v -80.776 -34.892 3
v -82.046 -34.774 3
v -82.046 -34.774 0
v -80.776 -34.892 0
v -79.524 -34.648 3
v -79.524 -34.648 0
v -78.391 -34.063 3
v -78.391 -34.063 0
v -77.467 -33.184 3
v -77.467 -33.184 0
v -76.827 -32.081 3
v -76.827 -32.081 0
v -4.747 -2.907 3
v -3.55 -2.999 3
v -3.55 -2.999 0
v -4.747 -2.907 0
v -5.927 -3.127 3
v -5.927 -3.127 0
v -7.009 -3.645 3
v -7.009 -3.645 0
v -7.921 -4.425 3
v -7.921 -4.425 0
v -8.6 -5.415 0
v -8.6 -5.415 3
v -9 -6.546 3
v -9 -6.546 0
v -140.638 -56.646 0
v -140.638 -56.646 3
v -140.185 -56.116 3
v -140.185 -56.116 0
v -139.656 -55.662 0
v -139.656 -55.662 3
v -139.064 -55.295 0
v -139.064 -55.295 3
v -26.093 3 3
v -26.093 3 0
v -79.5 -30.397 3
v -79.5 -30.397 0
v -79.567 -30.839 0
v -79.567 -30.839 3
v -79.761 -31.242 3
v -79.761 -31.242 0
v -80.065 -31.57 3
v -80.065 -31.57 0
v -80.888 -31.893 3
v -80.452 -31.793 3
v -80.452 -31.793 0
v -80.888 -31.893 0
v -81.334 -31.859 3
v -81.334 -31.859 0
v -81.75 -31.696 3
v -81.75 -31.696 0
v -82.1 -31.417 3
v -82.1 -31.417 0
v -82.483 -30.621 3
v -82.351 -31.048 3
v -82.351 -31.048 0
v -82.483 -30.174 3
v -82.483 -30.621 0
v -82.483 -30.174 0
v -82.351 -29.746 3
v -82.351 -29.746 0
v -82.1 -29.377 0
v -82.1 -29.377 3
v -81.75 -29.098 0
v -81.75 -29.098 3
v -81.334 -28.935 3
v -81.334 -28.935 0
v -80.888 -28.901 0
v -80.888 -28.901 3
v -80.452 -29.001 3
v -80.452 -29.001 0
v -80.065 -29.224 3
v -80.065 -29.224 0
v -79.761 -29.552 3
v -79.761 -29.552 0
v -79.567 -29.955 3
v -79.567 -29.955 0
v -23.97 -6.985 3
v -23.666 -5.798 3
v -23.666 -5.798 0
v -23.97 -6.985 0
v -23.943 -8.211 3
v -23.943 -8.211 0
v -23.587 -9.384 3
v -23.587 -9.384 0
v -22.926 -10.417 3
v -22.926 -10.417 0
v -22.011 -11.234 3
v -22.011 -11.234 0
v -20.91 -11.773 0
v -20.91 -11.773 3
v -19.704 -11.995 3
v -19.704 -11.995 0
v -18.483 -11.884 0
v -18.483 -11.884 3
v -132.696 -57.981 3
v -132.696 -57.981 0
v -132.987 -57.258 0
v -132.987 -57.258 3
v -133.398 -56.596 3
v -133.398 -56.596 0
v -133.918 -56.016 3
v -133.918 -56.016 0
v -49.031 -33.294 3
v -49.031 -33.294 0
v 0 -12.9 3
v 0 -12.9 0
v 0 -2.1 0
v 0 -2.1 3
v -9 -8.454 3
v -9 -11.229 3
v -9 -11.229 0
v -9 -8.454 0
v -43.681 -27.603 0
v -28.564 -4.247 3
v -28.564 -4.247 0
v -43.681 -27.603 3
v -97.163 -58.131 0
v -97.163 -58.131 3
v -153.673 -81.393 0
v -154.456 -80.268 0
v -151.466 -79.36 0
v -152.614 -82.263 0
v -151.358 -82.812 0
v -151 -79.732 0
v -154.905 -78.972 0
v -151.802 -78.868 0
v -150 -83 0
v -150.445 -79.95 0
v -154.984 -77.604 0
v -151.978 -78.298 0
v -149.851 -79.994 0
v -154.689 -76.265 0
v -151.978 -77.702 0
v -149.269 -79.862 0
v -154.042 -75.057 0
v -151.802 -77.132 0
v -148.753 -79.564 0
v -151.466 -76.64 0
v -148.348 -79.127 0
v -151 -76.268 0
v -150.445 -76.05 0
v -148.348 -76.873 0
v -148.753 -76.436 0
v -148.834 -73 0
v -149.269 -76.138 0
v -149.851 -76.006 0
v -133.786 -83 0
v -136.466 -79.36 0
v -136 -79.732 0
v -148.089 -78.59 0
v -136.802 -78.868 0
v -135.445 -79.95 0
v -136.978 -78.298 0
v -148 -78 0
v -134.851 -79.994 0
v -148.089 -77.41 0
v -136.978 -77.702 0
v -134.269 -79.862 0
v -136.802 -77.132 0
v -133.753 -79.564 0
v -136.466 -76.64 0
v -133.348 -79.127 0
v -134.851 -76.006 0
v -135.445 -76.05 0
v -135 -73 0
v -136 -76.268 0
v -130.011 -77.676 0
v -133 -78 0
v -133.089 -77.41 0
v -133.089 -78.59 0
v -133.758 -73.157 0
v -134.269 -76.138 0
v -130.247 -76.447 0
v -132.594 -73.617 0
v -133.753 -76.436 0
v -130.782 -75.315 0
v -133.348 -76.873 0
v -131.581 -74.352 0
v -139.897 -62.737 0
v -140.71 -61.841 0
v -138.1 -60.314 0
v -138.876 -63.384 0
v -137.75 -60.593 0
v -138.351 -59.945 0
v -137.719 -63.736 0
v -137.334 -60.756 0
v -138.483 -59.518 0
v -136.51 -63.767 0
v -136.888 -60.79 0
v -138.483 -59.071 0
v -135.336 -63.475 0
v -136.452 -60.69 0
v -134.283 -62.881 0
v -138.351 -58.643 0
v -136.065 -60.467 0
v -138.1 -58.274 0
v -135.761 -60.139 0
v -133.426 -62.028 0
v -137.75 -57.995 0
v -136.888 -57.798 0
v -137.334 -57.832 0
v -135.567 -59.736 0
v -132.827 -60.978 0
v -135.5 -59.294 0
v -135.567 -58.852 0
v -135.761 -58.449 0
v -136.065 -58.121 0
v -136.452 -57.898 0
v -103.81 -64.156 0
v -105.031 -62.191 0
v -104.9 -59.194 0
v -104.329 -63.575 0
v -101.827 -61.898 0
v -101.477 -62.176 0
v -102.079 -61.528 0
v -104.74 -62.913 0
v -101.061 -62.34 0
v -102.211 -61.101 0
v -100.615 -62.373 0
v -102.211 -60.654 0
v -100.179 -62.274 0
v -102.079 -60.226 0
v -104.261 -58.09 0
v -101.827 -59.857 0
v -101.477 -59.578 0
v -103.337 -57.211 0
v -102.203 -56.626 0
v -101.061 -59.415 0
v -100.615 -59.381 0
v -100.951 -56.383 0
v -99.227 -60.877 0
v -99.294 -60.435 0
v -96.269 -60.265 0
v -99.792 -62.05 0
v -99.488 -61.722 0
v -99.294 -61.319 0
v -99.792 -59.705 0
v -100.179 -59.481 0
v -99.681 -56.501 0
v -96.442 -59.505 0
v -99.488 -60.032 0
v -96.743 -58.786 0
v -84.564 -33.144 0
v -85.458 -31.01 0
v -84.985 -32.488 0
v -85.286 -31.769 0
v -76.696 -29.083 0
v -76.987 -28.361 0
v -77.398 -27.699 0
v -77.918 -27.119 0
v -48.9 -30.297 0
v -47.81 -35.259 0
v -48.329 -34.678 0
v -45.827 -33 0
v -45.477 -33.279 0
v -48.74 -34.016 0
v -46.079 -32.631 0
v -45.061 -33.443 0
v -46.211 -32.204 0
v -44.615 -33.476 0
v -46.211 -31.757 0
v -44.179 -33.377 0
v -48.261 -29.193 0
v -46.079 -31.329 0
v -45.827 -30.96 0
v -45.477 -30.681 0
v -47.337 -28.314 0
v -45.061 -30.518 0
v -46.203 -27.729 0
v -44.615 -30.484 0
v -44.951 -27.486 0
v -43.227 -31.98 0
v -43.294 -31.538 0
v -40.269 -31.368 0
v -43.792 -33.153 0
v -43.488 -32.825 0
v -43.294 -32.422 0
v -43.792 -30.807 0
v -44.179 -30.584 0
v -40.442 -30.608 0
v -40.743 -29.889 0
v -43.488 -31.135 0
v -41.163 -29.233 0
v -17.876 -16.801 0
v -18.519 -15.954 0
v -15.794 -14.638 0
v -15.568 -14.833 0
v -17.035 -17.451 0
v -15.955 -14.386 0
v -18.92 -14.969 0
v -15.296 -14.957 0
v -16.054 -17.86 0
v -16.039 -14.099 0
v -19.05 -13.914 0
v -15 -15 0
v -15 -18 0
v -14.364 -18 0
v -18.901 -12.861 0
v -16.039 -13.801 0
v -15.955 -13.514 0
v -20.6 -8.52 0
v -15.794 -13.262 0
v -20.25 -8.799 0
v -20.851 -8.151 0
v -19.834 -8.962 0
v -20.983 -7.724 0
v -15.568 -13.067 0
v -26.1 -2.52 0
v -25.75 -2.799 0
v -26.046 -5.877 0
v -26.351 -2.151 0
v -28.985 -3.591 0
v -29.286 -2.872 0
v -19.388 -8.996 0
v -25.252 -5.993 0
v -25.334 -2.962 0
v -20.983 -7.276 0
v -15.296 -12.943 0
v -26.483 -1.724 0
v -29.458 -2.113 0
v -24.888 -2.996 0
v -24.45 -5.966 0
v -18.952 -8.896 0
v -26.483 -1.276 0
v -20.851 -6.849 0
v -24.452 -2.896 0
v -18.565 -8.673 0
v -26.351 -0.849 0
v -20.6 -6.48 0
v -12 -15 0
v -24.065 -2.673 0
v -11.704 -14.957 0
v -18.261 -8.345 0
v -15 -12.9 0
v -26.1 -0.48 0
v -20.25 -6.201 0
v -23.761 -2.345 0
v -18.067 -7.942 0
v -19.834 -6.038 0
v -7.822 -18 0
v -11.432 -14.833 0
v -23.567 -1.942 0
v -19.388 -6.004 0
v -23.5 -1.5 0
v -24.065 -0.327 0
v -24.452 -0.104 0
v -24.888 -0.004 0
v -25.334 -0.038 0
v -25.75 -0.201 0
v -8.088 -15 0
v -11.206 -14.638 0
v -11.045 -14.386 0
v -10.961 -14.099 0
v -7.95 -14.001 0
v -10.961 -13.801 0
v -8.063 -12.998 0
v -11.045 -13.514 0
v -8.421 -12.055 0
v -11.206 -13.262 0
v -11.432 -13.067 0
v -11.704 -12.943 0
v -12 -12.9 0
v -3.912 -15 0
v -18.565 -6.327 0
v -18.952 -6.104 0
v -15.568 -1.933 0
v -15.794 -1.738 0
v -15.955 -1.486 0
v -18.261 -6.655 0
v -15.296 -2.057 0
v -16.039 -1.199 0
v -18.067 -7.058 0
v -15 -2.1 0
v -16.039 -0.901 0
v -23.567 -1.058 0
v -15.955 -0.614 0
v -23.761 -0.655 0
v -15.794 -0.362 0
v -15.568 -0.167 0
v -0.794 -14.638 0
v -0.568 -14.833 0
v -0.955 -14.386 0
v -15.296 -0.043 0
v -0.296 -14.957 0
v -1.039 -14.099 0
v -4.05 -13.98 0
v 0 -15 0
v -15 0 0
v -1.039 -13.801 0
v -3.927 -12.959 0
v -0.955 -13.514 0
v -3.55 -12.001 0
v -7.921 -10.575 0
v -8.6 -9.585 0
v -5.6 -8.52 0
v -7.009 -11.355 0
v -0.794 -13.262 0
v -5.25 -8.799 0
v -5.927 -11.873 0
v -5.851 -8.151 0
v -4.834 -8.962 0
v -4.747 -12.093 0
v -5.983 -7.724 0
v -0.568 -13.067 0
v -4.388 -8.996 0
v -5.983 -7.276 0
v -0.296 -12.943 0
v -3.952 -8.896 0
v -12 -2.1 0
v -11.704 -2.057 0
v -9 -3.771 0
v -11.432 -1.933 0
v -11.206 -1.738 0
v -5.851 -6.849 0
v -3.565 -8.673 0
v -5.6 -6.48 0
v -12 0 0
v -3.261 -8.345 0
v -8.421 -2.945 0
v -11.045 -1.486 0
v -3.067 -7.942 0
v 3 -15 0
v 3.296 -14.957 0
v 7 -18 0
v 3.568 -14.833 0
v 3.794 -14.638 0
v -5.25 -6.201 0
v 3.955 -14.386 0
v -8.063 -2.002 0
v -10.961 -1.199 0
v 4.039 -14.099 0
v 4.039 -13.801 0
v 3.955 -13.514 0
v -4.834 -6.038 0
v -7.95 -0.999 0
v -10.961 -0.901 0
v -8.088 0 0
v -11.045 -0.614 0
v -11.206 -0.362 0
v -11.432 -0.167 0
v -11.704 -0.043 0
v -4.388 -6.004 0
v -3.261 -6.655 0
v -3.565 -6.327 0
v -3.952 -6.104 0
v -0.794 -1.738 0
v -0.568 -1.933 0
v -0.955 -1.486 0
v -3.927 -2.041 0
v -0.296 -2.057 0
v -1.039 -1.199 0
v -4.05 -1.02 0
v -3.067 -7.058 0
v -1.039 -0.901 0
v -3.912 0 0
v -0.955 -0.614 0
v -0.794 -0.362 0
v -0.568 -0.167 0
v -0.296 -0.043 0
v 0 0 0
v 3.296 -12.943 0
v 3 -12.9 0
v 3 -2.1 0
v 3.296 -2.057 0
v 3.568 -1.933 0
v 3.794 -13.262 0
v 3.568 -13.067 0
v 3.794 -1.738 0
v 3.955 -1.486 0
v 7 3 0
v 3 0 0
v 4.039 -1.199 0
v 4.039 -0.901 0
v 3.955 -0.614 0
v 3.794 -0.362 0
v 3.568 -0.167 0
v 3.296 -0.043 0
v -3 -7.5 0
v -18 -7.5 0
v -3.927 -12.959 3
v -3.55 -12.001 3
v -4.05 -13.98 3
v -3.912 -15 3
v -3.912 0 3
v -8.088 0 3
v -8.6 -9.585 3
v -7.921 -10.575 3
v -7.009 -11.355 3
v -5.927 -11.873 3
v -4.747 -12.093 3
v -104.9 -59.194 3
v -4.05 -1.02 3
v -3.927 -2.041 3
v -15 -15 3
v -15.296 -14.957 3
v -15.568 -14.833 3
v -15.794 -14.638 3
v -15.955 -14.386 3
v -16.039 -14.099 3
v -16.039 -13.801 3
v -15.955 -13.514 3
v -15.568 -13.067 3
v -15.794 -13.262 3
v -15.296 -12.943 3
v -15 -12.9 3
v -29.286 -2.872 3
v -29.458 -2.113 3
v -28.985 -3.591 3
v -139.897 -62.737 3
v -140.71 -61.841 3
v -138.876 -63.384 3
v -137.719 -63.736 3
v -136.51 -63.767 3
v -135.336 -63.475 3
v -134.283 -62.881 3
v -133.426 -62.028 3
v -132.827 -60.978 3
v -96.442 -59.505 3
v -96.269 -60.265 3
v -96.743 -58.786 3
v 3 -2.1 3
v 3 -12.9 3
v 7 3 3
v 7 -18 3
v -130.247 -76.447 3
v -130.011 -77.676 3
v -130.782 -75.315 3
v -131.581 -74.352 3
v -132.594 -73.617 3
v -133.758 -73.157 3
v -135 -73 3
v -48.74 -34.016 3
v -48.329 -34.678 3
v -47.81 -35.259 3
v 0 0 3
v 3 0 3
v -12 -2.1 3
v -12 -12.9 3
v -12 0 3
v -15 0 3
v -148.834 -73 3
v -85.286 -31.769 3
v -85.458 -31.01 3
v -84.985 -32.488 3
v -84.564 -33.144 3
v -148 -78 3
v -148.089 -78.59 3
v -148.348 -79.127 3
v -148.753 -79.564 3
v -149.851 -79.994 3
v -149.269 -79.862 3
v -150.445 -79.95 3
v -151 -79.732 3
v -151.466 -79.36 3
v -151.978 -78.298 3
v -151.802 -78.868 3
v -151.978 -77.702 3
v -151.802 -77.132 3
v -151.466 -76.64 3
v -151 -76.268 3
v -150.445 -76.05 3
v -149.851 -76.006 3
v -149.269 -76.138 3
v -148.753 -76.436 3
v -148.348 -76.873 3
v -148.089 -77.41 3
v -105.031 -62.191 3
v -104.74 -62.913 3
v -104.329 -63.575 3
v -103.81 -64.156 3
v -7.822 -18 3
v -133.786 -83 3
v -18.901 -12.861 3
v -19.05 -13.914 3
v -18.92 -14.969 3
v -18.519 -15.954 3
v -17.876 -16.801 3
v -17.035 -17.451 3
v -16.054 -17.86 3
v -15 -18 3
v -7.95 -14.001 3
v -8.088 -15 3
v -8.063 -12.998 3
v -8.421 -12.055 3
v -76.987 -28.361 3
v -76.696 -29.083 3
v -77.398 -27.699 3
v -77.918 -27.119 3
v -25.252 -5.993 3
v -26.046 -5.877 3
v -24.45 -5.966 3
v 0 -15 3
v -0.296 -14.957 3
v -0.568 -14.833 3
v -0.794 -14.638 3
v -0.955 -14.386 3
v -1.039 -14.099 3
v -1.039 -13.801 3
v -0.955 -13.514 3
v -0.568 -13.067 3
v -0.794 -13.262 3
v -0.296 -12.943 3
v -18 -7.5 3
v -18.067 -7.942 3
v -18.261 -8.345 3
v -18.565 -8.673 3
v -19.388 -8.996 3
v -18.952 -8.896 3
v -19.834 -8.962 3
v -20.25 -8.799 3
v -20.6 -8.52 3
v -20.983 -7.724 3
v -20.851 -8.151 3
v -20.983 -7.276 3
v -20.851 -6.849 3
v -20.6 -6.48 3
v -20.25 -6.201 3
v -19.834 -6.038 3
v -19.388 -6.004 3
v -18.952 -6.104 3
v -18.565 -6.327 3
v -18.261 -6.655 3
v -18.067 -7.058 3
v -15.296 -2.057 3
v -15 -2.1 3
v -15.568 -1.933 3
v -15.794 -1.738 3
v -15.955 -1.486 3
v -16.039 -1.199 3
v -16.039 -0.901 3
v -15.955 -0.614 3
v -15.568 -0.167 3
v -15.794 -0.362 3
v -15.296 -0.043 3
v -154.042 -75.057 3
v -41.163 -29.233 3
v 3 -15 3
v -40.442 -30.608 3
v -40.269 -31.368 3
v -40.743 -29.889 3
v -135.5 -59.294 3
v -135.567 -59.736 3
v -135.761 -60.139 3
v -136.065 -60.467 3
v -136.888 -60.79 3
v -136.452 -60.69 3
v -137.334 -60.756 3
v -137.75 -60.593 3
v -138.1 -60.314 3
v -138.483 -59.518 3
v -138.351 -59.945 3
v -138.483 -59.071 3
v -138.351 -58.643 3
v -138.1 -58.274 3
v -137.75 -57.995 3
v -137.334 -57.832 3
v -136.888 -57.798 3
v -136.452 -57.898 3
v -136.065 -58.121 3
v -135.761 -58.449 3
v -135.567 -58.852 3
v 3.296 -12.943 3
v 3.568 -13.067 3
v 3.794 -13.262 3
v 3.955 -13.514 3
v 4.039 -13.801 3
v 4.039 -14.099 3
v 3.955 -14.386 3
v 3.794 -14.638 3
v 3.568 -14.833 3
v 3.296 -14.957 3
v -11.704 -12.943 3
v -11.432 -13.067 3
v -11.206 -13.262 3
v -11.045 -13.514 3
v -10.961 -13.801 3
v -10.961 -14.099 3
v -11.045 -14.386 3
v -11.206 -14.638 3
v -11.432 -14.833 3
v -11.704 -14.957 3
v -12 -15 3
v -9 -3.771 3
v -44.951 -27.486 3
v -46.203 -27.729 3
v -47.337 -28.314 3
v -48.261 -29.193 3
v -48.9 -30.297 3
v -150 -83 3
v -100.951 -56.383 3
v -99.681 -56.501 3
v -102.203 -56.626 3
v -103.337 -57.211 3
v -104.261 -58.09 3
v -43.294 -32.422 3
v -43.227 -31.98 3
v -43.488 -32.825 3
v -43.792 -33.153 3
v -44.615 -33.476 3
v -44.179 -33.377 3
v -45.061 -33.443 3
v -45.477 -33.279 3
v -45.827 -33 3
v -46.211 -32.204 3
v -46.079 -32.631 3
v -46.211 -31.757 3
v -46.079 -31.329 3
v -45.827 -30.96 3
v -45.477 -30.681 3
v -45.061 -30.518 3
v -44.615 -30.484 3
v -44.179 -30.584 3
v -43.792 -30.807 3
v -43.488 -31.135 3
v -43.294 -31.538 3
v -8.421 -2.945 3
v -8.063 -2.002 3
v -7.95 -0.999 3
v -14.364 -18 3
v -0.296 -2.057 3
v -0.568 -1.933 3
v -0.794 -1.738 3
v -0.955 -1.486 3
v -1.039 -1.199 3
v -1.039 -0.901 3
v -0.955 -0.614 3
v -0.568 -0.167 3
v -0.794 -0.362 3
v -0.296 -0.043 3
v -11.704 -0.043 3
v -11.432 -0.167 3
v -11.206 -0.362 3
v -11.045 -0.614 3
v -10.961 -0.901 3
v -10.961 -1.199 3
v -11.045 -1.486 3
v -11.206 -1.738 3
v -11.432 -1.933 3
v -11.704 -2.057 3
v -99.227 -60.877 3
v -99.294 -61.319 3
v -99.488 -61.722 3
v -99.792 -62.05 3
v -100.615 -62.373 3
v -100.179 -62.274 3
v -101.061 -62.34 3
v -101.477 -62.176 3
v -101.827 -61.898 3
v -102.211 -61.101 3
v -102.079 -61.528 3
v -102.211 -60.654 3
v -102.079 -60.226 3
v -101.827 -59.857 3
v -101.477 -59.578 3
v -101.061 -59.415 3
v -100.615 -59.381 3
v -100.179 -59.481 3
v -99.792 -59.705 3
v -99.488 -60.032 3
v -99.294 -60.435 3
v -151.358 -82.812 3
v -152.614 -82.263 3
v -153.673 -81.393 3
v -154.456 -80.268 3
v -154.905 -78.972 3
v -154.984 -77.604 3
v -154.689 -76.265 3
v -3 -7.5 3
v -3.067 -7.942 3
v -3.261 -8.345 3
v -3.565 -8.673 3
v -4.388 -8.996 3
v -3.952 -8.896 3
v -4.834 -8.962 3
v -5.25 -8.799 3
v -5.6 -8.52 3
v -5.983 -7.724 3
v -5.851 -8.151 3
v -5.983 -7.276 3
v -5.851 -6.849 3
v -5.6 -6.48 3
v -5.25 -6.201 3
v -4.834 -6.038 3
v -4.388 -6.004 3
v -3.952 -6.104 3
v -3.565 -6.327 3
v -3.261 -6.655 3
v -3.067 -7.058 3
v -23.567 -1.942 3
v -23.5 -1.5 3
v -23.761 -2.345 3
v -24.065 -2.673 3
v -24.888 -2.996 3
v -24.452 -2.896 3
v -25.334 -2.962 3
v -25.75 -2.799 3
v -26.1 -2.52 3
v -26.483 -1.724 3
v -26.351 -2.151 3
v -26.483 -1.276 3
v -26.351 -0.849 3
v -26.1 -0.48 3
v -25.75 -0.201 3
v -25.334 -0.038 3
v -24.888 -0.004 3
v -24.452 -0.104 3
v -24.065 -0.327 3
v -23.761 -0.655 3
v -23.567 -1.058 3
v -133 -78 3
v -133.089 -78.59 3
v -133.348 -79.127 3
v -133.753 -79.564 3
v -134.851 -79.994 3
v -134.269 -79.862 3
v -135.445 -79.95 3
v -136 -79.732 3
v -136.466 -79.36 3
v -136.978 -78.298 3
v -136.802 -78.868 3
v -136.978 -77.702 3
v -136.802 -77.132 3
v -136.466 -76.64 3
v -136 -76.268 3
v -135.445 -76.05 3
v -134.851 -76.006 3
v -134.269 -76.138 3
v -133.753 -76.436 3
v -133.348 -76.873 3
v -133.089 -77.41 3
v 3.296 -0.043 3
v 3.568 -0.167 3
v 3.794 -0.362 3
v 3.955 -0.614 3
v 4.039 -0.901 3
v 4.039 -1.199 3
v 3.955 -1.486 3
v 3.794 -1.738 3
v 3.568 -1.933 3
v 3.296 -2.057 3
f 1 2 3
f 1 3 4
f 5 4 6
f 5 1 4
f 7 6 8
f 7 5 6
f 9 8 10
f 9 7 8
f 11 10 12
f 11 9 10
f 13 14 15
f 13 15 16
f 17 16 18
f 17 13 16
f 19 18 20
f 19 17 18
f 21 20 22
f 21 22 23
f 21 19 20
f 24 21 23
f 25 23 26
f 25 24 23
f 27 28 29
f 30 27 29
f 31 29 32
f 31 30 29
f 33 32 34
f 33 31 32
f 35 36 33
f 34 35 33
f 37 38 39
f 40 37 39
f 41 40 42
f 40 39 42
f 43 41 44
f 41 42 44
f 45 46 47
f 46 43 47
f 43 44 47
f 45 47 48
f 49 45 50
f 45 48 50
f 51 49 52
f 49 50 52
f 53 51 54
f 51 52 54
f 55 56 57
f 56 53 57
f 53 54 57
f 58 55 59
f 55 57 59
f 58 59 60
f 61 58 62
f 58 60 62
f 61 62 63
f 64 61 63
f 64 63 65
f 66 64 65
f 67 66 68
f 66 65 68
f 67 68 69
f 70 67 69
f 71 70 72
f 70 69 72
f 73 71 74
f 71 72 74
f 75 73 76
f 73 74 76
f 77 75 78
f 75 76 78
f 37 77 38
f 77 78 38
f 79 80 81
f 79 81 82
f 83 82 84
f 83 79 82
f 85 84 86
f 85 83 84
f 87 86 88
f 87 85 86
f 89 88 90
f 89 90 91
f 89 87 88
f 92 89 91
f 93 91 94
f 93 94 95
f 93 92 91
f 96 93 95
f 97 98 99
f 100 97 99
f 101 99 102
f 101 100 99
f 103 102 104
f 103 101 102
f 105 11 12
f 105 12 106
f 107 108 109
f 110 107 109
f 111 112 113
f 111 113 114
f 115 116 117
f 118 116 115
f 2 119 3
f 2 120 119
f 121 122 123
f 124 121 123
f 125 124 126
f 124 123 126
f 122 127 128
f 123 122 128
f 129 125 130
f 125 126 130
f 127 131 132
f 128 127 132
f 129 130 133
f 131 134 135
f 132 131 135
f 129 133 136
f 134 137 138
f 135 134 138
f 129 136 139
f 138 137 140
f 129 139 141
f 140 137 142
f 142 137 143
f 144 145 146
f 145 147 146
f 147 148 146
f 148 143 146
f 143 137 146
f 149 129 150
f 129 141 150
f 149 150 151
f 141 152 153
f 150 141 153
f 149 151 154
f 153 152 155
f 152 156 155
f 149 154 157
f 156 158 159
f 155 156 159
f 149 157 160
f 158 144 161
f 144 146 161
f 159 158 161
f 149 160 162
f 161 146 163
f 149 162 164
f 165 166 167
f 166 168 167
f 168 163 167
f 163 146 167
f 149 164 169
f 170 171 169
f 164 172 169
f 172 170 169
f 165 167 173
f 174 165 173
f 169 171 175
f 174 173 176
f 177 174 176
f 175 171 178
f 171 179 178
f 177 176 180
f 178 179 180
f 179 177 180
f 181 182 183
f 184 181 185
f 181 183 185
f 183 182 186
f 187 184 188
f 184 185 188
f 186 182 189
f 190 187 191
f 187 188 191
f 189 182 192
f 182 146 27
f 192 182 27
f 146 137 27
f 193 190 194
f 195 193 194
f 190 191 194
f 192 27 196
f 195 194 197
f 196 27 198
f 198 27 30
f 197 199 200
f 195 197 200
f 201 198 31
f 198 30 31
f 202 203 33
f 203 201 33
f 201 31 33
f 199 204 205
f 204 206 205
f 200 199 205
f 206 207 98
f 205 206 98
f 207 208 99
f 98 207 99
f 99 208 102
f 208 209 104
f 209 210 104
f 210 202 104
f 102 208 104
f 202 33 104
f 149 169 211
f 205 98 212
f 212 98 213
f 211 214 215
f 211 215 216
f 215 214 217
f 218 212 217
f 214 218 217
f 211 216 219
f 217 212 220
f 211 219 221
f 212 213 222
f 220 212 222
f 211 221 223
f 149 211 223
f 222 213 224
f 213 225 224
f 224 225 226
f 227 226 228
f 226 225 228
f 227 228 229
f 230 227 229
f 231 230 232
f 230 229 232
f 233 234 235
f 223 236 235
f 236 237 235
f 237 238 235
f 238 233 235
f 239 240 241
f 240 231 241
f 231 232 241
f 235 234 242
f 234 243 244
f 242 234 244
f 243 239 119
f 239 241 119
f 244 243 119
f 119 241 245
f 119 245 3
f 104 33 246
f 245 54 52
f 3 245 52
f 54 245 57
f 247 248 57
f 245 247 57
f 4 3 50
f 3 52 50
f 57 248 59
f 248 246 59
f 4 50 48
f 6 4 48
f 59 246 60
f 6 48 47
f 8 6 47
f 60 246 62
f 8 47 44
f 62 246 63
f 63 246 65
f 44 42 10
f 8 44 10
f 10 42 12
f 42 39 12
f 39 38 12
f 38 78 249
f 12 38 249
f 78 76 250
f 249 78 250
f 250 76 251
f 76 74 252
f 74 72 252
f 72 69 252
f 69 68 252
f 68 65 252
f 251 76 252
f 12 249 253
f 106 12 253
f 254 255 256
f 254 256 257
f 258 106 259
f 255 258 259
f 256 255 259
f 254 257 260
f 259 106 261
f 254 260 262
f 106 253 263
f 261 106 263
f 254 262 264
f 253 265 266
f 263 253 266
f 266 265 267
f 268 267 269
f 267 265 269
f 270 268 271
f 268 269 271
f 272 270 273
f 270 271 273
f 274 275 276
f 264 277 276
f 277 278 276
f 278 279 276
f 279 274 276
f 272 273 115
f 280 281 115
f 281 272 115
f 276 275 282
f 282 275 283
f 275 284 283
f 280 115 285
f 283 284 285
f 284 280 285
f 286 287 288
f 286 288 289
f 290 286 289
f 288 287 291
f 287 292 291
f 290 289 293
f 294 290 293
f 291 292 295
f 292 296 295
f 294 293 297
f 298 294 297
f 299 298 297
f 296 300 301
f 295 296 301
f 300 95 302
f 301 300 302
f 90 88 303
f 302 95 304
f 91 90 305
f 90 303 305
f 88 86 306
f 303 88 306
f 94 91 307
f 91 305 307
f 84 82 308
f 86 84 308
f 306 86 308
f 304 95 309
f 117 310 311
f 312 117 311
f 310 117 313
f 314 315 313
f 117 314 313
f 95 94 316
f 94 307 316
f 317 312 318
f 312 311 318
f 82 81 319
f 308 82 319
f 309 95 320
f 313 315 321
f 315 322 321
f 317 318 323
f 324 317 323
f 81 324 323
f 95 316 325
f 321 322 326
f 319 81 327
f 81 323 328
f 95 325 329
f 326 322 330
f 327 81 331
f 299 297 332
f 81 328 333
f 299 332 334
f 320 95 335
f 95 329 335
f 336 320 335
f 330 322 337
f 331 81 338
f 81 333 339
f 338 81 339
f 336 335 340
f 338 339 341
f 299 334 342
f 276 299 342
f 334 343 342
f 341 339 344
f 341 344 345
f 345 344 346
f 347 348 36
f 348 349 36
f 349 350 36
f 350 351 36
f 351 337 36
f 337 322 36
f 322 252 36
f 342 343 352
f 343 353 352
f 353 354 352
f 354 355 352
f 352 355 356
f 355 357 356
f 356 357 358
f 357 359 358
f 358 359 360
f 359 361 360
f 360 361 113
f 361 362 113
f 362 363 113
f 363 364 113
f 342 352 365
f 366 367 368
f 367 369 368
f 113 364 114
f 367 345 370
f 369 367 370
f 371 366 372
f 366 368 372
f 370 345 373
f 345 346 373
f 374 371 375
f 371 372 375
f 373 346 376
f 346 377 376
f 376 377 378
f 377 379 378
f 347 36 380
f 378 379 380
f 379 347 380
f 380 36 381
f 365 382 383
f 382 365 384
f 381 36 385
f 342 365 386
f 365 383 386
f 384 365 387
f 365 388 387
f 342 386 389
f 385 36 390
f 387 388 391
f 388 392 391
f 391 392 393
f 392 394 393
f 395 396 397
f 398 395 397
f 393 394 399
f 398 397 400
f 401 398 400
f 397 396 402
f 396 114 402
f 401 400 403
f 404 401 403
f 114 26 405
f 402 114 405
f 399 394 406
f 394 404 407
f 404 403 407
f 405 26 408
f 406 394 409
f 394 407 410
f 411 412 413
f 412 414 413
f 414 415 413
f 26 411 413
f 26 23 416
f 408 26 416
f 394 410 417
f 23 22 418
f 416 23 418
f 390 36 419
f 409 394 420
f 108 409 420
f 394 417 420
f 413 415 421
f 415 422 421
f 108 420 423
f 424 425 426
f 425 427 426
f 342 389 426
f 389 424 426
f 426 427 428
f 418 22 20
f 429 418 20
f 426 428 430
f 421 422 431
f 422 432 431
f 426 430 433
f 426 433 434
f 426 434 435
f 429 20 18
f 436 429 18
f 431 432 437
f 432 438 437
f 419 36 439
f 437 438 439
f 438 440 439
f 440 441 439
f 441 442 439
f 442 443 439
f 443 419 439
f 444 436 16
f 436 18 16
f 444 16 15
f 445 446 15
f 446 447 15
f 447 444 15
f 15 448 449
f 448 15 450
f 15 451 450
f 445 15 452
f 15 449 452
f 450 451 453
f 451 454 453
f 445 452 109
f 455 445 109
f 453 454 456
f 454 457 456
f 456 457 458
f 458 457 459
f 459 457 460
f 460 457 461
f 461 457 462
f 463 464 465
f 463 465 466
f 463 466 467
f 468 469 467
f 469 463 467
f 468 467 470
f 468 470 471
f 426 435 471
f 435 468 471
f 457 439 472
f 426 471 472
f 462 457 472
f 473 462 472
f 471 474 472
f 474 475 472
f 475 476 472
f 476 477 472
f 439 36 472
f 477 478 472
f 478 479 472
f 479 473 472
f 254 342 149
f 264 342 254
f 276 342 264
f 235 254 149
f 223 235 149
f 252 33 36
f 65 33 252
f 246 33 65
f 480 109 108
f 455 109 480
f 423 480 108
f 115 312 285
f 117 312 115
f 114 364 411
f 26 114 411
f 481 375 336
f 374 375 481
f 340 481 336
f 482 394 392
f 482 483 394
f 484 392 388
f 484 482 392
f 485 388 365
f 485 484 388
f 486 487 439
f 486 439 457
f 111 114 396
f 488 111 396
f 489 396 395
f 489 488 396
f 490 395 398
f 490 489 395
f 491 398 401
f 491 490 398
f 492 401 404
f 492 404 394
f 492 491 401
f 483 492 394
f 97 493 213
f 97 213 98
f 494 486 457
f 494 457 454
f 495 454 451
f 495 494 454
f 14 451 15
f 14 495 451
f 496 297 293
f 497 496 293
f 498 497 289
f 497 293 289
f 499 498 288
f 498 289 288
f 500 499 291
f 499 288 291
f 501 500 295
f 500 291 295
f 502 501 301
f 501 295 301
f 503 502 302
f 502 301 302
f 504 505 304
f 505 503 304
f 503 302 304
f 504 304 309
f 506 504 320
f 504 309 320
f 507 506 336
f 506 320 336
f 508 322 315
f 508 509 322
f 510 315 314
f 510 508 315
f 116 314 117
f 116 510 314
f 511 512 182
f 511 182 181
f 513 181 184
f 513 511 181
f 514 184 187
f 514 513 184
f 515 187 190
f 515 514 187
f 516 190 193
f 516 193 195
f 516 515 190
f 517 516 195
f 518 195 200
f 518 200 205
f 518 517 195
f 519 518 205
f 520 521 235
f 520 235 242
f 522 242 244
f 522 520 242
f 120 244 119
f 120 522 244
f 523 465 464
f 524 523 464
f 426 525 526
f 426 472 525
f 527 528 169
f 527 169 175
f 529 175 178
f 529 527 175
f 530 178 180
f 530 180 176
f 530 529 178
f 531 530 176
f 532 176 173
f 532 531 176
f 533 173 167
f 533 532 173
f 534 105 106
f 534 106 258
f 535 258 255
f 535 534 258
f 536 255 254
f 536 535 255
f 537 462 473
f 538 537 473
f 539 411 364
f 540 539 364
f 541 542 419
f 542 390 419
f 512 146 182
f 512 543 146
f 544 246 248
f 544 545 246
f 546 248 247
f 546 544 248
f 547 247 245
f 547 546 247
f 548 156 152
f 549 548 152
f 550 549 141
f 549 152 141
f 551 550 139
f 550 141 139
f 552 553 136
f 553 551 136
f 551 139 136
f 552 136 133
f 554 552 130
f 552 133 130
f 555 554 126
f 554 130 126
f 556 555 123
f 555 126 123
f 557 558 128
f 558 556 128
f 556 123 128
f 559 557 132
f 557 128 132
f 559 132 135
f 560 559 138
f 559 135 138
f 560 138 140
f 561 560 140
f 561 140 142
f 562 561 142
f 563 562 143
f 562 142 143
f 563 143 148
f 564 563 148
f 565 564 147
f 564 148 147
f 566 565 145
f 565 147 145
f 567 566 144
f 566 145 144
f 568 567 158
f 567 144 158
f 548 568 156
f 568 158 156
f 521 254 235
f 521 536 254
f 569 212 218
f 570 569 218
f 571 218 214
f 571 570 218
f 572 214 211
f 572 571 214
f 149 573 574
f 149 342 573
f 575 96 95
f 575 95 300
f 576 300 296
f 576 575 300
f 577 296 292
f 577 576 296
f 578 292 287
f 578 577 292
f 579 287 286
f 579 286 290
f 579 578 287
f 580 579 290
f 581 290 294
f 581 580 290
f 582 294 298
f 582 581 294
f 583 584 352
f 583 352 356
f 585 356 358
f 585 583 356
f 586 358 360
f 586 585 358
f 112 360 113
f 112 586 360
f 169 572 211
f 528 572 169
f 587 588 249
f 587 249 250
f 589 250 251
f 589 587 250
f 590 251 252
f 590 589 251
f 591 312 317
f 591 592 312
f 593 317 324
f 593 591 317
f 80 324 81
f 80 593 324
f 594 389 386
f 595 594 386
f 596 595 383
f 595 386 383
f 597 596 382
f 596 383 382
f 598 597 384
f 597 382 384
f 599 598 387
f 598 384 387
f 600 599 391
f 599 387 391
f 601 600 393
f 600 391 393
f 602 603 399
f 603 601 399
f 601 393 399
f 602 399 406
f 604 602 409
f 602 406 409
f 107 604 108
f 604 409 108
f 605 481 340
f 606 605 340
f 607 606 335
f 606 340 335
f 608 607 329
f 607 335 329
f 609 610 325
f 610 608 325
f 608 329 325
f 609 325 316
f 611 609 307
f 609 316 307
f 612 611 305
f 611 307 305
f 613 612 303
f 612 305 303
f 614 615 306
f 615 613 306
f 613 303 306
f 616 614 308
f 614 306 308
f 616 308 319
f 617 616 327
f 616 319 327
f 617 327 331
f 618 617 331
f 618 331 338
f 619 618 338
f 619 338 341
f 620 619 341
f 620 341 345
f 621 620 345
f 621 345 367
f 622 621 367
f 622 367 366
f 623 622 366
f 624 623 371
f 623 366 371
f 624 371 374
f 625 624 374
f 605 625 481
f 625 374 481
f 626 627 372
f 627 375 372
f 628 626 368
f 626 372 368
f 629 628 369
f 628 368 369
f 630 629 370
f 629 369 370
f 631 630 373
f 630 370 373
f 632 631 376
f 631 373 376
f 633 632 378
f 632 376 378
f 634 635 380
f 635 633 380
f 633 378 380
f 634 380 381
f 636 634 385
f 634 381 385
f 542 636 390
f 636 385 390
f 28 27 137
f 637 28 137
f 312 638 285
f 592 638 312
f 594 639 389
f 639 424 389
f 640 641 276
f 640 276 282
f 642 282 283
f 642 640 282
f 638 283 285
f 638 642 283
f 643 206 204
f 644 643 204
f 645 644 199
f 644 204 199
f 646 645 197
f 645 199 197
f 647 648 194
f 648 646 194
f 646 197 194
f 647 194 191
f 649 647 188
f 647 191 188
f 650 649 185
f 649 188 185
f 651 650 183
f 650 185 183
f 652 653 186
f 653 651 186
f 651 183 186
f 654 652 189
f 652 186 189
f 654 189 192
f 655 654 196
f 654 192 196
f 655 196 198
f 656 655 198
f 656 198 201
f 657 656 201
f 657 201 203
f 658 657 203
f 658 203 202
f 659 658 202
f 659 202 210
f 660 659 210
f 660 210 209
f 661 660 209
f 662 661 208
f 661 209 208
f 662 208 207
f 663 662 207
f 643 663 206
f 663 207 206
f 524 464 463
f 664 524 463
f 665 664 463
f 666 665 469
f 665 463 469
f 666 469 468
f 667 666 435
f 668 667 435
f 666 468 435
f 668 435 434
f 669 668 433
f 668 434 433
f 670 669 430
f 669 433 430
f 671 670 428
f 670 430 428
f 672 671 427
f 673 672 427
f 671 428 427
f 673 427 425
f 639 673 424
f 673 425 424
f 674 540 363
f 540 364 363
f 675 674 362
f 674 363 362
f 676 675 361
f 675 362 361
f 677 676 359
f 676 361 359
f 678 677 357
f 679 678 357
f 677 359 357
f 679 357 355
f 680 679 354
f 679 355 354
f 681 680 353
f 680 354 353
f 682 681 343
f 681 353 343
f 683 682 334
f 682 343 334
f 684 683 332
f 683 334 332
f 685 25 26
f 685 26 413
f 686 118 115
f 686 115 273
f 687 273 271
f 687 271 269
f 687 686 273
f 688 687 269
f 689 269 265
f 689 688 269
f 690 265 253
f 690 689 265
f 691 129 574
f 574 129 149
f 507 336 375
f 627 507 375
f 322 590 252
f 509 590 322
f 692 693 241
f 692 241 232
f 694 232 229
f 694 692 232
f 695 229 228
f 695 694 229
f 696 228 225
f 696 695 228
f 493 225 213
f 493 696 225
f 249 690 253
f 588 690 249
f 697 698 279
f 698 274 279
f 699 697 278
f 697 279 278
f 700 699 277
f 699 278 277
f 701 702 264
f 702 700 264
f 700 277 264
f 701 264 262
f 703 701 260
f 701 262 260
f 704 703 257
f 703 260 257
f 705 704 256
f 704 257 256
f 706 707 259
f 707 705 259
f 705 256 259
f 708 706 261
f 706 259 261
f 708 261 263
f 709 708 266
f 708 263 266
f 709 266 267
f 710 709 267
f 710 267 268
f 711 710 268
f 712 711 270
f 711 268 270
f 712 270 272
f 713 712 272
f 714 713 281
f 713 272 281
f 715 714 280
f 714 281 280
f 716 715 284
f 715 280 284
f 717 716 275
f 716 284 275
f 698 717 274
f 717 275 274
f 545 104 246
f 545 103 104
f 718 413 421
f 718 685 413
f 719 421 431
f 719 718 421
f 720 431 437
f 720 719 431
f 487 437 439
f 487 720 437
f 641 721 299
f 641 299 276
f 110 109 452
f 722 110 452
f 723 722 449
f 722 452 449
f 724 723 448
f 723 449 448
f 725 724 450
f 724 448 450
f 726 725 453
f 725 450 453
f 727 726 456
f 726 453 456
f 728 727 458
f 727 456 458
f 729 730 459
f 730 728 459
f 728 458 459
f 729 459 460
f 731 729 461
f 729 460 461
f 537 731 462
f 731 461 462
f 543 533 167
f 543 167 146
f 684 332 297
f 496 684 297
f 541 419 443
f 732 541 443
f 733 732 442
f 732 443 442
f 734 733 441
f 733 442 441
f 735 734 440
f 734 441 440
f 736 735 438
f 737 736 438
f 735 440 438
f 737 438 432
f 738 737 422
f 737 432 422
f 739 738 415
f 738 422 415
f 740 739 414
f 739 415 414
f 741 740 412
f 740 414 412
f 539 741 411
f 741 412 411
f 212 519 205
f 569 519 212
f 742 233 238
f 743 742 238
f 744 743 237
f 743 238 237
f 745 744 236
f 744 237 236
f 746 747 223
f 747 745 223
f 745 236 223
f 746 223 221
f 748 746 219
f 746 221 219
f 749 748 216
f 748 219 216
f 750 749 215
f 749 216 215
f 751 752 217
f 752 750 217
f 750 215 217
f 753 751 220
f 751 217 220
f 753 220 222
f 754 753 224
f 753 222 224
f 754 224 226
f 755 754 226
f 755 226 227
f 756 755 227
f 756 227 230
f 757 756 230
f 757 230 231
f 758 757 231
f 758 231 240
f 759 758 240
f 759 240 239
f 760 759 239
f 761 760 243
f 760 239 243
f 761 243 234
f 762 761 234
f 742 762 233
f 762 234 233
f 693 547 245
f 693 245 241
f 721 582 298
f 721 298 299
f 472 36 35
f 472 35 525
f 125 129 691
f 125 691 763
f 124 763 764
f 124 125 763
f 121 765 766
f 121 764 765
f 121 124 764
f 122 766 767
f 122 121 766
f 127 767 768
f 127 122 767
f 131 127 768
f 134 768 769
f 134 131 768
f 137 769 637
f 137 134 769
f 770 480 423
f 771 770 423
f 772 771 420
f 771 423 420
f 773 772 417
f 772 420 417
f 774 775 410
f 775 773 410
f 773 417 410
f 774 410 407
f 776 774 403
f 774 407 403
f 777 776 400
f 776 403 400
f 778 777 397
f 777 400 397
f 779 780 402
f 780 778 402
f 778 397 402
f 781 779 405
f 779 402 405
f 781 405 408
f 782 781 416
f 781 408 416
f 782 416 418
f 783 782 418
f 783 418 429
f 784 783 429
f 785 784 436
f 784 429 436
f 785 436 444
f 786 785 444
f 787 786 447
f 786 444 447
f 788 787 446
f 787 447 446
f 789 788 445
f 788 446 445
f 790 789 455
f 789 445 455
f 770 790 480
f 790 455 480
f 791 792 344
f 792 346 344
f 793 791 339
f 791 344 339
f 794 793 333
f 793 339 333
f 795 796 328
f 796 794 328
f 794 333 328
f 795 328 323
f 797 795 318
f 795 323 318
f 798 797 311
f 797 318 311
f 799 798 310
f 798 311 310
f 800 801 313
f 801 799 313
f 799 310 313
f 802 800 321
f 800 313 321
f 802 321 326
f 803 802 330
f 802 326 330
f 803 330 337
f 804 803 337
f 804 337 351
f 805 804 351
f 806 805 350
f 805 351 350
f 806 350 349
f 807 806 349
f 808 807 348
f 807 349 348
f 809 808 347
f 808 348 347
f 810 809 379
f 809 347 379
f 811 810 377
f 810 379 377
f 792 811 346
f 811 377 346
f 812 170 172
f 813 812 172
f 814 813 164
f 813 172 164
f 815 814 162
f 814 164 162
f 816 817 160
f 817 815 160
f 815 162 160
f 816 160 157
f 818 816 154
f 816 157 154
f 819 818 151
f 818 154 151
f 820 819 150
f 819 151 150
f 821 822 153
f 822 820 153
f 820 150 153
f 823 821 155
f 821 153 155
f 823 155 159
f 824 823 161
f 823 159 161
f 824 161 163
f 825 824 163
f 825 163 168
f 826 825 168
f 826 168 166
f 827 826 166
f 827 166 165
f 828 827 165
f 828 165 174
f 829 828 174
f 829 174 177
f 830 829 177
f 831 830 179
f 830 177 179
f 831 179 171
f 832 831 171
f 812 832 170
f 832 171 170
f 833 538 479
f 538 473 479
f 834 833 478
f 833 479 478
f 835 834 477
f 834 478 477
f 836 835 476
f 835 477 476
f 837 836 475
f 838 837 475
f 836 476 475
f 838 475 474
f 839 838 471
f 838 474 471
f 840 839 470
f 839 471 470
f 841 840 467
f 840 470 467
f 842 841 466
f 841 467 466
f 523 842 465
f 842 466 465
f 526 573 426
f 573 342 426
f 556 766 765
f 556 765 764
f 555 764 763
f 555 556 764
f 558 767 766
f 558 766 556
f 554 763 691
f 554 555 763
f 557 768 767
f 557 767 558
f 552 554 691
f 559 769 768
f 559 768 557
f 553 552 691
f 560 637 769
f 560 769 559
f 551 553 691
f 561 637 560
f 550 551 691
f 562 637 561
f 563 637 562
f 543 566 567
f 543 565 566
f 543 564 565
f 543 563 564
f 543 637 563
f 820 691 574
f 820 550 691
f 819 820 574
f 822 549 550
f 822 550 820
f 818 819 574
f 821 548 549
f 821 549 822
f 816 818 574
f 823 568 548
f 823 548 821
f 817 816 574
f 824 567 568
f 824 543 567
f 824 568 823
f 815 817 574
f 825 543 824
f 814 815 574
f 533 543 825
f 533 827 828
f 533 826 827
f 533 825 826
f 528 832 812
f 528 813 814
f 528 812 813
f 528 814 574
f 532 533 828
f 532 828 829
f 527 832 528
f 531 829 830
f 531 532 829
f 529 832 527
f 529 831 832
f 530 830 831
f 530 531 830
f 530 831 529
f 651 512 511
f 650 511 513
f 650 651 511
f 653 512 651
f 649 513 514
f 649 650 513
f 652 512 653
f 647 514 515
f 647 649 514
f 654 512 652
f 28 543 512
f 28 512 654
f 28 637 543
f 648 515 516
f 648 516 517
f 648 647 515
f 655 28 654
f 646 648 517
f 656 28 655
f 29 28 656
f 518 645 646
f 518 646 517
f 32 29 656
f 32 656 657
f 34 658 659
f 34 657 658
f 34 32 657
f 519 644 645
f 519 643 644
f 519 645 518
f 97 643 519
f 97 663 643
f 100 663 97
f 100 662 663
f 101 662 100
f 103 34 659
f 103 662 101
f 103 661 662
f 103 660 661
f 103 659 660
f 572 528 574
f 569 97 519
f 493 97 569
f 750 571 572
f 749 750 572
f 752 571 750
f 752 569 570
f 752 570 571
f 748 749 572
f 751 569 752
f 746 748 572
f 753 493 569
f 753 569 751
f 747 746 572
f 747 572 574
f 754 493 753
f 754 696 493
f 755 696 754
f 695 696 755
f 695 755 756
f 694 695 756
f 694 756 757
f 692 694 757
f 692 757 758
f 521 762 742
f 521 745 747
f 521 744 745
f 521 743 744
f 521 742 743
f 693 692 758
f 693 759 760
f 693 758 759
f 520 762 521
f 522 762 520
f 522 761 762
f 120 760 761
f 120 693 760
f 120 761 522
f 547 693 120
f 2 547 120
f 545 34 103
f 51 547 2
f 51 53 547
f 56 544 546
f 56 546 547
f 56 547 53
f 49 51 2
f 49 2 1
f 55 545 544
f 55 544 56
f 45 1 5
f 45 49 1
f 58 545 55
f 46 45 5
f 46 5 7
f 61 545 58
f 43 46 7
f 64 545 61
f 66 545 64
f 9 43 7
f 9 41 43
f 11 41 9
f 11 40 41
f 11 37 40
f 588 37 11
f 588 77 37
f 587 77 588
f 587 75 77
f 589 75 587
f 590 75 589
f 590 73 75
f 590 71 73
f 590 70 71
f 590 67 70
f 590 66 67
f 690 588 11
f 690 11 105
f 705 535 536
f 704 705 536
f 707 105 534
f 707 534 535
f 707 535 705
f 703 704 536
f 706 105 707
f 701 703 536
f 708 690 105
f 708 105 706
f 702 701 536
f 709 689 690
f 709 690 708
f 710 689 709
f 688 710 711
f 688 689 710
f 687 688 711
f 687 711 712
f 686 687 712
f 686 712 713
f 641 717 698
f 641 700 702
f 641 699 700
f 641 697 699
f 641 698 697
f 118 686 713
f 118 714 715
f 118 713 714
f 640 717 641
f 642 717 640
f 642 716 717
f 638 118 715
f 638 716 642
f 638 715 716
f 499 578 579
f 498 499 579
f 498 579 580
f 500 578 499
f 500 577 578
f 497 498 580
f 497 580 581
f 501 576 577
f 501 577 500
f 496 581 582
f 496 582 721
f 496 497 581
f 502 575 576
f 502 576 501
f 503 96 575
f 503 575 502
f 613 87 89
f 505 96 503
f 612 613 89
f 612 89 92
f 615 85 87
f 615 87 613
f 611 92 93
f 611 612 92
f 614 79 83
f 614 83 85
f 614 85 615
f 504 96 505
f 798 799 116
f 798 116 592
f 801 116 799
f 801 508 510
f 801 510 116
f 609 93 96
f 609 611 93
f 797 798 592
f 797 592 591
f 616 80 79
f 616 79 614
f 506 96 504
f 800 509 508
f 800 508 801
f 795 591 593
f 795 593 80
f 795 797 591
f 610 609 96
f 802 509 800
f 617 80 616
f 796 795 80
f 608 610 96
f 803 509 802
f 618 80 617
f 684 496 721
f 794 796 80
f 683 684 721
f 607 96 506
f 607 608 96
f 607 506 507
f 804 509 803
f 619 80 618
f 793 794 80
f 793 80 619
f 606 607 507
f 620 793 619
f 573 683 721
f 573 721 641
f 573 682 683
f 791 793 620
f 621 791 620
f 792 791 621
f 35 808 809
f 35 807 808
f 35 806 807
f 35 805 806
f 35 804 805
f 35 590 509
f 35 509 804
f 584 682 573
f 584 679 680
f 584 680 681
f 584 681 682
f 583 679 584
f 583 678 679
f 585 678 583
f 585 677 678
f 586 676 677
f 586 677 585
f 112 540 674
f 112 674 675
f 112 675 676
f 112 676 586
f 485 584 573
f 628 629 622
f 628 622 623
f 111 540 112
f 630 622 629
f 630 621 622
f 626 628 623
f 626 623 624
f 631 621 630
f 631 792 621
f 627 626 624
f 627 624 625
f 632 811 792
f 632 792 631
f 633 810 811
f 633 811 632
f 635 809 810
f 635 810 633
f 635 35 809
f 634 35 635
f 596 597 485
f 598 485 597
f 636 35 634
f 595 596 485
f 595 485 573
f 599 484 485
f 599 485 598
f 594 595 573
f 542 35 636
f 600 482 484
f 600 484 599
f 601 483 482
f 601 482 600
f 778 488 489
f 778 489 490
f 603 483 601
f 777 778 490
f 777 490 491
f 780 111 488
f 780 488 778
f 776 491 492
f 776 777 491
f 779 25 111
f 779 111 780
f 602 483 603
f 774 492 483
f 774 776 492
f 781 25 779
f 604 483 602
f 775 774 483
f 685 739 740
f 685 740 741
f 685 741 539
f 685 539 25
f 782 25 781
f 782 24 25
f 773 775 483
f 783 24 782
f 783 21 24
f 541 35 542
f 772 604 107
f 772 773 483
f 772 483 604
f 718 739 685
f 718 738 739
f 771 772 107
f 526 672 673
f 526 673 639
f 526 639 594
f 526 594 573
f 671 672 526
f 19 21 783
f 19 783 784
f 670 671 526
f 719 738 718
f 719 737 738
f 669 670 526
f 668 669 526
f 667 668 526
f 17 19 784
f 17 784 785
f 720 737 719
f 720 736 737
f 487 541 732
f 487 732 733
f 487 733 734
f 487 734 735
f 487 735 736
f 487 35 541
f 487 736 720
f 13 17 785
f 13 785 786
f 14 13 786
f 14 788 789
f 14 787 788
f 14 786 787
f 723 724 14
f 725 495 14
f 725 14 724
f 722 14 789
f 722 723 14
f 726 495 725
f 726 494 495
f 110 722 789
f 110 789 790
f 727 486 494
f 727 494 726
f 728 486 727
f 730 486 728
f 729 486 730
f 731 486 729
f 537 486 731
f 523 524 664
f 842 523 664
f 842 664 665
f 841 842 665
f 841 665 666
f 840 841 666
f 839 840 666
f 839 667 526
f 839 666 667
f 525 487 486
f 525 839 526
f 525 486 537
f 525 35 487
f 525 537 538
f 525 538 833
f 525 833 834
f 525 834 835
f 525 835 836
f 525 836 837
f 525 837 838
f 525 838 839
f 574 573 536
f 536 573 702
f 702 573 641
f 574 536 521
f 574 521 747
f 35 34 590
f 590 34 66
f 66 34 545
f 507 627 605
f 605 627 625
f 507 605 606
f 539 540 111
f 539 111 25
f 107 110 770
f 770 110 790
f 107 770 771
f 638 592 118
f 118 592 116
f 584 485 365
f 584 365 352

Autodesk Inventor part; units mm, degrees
ref_plane "YZ Plane" through (0, 0, 0) normal (1, 0, 0) x (0, 1, 0)
ref_plane "XZ Plane" through (0, 0, 0) normal (0, 1, 0) x (-1, 0, 0)
ref_plane "XY Plane" through (0, 0, 0) normal (0, 0, 1) x (1, 0, 0)
sketch "スケッチ1" plane through (0, 0, 0) normal (0, 0, 1) x (1, 0, 0)
  line L0 (0, 0) -> (3, 0)
  line L1 (3, 0) -> (3, -15)
  line L2 (3, -15) -> (0, -15)
  line L3 (0, -15) -> (0, 0)
  line L4 (-15, 0) -> (-12, 0)
  line L5 (-12, 0) -> (-12, -15)
  line L6 (-12, -15) -> (-15, -15)
  line L7 (-15, -15) -> (-15, 0)
  line L8 (-26.0926, 3) -> (-139.0635, -55.2952)
  line L9 (7, 3) -> (7, -18)
  line L10 (-7.8217, -18) -> (-133.786, -83)
  circle A0 centre (-135, -78) radius 2
  circle A1 centre (-150, -78) radius 2
  line L11 (-150, -78) -> (-135, -78) construction
  arc A2 (-154.0422, -75.0571) -> (-150, -83) centre (-150, -78) ccw
  line L12 (-140.638, -56.6456) -> (-154.0422, -75.0571)
  circle A3 centre (-15, -1.05) radius 1.05
  circle A4 centre (-15, -13.95) radius 1.05
  circle A5 centre (-12, -13.95) radius 1.05
  circle A6 centre (-12, -1.05) radius 1.05
  circle A7 centre (0, -1.05) radius 1.05
  circle A8 centre (3, -1.05) radius 1.05
  circle A9 centre (0, -13.95) radius 1.05
  circle A10 centre (3, -13.95) radius 1.05
  arc A11 (-139.0635, -55.2952) -> (-140.638, -56.6456) centre (-137, -59.2941) ccw
  circle A12 centre (-100.7273, -60.8773) radius 4.5 construction
  circle A13 centre (-81, -30.3971) radius 4.5 construction
  circle A14 centre (-44.7273, -31.9802) radius 4.5 construction
  circle A15 centre (-25, -1.5) radius 4.5 construction
  circle A16 centre (-137, -59.2941) radius 1.5
  circle A17 centre (-100.7273, -60.8773) radius 1.5
  circle A18 centre (-81, -30.3971) radius 1.5
  circle A19 centre (-44.7273, -31.9802) radius 1.5
  circle A20 centre (-25, -1.5) radius 1.5
  circle A21 centre (-4.5, -7.5) radius 1.5
  circle A22 centre (-19.5, -7.5) radius 1.5
  line L13 (-26.0926, 3) -> (7, 3)
  line L14 (-7.8217, -18) -> (7, -18)
  line L15 (-150, -83) -> (-133.786, -83)
  circle A23 centre (-135, -78) radius 5
  line L16 (-25, -1.5) -> (-44.7273, -31.9802) construction
  line L17 (-44.7273, -31.9802) -> (-81, -30.3971) construction
  line L18 (-81, -30.3971) -> (-100.7273, -60.8773) construction
  line L19 (-100.7273, -60.8773) -> (-137, -59.2941) construction
  point P0 (0, -12.9)
  point P1 (0, -2.1)
  point P2 (3, -2.1)
  point P3 (3, -12.9)
  point P4 (-12, -2.1)
  point P5 (-12, -12.9)
  point P6 (-15, -12.9)
  point P7 (-15, -2.1)
  dimension "d0" = 3
  dimension "d1" = 15
  dimension "d2" = 3
  dimension "d3" = 15
  dimension "d4" = 12
  dimension "d5" = 4
  dimension "d6" = 4
  dimension "d7" = 15
  dimension "d8" = 4
  dimension "d12" = 3
  dimension "d13" = 2.1
  dimension "d14" = 2.1
  dimension "d15" = 2.1
  dimension "d16" = 2.1
  dimension "d17" = 2.1
  dimension "d18" = 2.1
  dimension "d19" = 2.1
  dimension "d20" = 2.1
  dimension "d23" = 9
  dimension "d24" = 9
  dimension "d25" = 9
  dimension "d26" = 9
  dimension "d27" = 9
  dimension "d28" = 3
  dimension "d29" = 3
  dimension "d30" = 3
  dimension "d31" = 3
  dimension "d32" = 3
  dimension "d33" = 10
  dimension "d34" = 3
  dimension "d35" = 3
  dimension "d36" = 4.5
  dimension "d37" = 4.5
  dimension "d38" = 7.5
  dimension "d39" = 7.5
  dimension "d60" = 120
  dimension "d61" = 3
  dimension "d62" = 3
  dimension "d63" = 3
  dimension "d64" = 60
extrude "押し出し1" add sketch "スケッチ1" along normal blind 3
sketch "スケッチ3" plane through (0, 0, 3) normal (0, 0, 1) x (1, 0, 0)
  line L0 (-150, -83) -> (-133.786, -83) projected
  line L1 (-133.786, -83) -> (-7.8217, -18) projected
  line L2 (-7.8217, -18) -> (7, -18) projected
  line L3 (7, -18) -> (7, 3) projected
  line L4 (7, 3) -> (-26.0926, 3) projected
  line L5 (-26.0926, 3) -> (-139.0635, -55.2952) projected
  arc A0 (-139.0635, -55.2952) -> (-140.638, -56.6456) centre (-137, -59.2941) ccw projected
  line L6 (-140.638, -56.6456) -> (-154.0422, -75.0571) projected
  arc A1 (-154.0422, -75.0571) -> (-150, -83) centre (-150, -78) ccw projected
  circle A2 centre (-19.5, -7.5) radius 1.5 projected
  circle A3 centre (-25, -1.5) radius 1.5 projected
  circle A4 centre (-44.7273, -31.9802) radius 1.5 projected
  circle A5 centre (-81, -30.3971) radius 1.5 projected
  circle A6 centre (-100.7273, -60.8773) radius 1.5 projected
  circle A7 centre (-137, -59.2941) radius 1.5 projected
  arc A8 (3, -2.1) -> (3, 0) centre (3, -1.05) ccw projected
  line L7 (3, -2.1) -> (3, -12.9) projected
  arc A9 (3, -15) -> (3, -12.9) centre (3, -13.95) ccw projected
  line L8 (3, -15) -> (0, -15) projected
  arc A10 (0, -12.9) -> (0, -15) centre (0, -13.95) ccw projected
  line L9 (0, -12.9) -> (0, -2.1) projected
  arc A11 (0, 0) -> (0, -2.1) centre (0, -1.05) ccw projected
  line L10 (0, 0) -> (3, 0) projected
  circle A12 centre (-135, -78) radius 2 projected
  line L11 (-12, -2.1) -> (-12, -12.9) projected
  arc A13 (-12, -15) -> (-12, -12.9) centre (-12, -13.95) ccw projected
  line L12 (-12, -15) -> (-15, -15) projected
  arc A14 (-15, -12.9) -> (-15, -15) centre (-15, -13.95) ccw projected
  line L13 (-15, -12.9) -> (-15, -2.1) projected
  arc A15 (-15, 0) -> (-15, -2.1) centre (-15, -1.05) ccw projected
  line L14 (-15, 0) -> (-12, 0) projected
  arc A16 (-12, -2.1) -> (-12, 0) centre (-12, -1.05) ccw projected
  circle A17 centre (-4.5, -7.5) radius 1.5 projected
  circle A18 centre (-150, -78) radius 2 projected
  line L15 (-137.6878, -57.9612) -> (-25.3642, 0)
  line L16 (-25.3642, 0) -> (4, 0)
  line L17 (4, 0) -> (4, -15)
  line L18 (4, -15) -> (-8.5501, -15)
  line L19 (-8.5501, -15) -> (-134.5144, -80)
  line L20 (-134.5144, -80) -> (-150, -80)
  arc A19 (-151.6169, -76.8229) -> (-150, -80) centre (-150, -78) ccw
  line L21 (-151.6169, -76.8229) -> (-138.2127, -58.4113)
  arc A20 (-137.6878, -57.9612) -> (-138.2127, -58.4113) centre (-137, -59.2941) ccw
  circle A21 centre (-81, -30.3971) radius 4.5
  circle A22 centre (-100.7273, -60.8773) radius 4.5
  circle A23 centre (-137, -59.2941) radius 4.5
  circle A24 centre (-44.7273, -31.9802) radius 4.5
  circle A25 centre (-19.5, -7.5) radius 4.5
  line L22 (-9, -11.2292) -> (-9, -3.7708)
  arc A26 (-9, -3.7708) -> (-12, 3) centre (-12, -1.05) ccw
  line L23 (-12, 3) -> (-15, 3)
  arc A27 (-15, 3) -> (-18, -3.7708) centre (-15, -1.05) ccw
  line L24 (-18, -3.7708) -> (-18, -11.2292)
  arc A28 (-18, -11.2292) -> (-15, -18) centre (-15, -13.95) ccw
  line L25 (-15, -18) -> (-12, -18)
  arc A29 (-12, -18) -> (-9, -11.2292) centre (-12, -13.95) ccw
  circle A30 centre (-25, -1.5) radius 4.5
  line L26 (-3, -3.7708) -> (-3, -11.2292)
  arc A31 (-3, -11.2292) -> (0, -18) centre (0, -13.95) ccw
  line L27 (0, -18) -> (3, -18)
  arc A32 (3, -18) -> (6, -11.2292) centre (3, -13.95) ccw
  line L28 (6, -11.2292) -> (6, -3.7708)
  arc A33 (6, -3.7708) -> (3, 3) centre (3, -1.05) ccw
  line L29 (3, 3) -> (0, 3)
  arc A34 (0, 3) -> (-3, -3.7708) centre (0, -1.05) ccw
  circle A35 centre (-4.5, -7.5) radius 4.6
  circle A36 centre (-135, -78) radius 5
  circle A37 centre (-150, -78) radius 5
  line L30 (-135, -73) -> (-150, -73)
  circle A38 centre (-137, -59.2941) radius 1.5 projected
  line L31 (-137, -59.2941) -> (-100.7273, -60.8773) construction
  line L32 (-137.0654, -60.7927) -> (-100.7927, -62.3759)
  line L33 (-100.6619, -59.3787) -> (-136.9346, -57.7956)
  arc A39 (-136.9346, -57.7956) -> (-137.0654, -60.7927) centre (-137, -59.2941) ccw
  arc A40 (-100.7927, -62.3759) -> (-100.6619, -59.3787) centre (-100.7273, -60.8773) ccw
  line L34 (-81, -30.3971) -> (-100.7273, -60.8773) construction
  line L35 (-82.2593, -29.5821) -> (-101.9866, -60.0623)
  line L36 (-99.4681, -61.6923) -> (-79.7407, -31.2121)
  arc A41 (-79.7407, -31.2121) -> (-82.2593, -29.5821) centre (-81, -30.3971) ccw
  arc A42 (-101.9866, -60.0623) -> (-99.4681, -61.6923) centre (-100.7273, -60.8773) ccw
  line L37 (-81, -30.3971) -> (-44.7273, -31.9802) construction
  line L38 (-81.0654, -31.8956) -> (-44.7927, -33.4788)
  line L39 (-44.6619, -30.4816) -> (-80.9346, -28.8985)
  arc A43 (-80.9346, -28.8985) -> (-81.0654, -31.8956) centre (-81, -30.3971) ccw
  arc A44 (-44.7927, -33.4788) -> (-44.6619, -30.4816) centre (-44.7273, -31.9802) ccw
  line L40 (-25, -1.5) -> (-44.7273, -31.9802) construction
  line L41 (-26.2593, -0.685) -> (-45.9866, -31.1652)
  line L42 (-43.4681, -32.7952) -> (-23.7407, -2.315)
  arc A45 (-23.7407, -2.315) -> (-26.2593, -0.685) centre (-25, -1.5) ccw
  arc A46 (-45.9866, -31.1652) -> (-43.4681, -32.7952) centre (-44.7273, -31.9802) ccw
  point P0 (-118.8637, -60.0857)
  point P1 (-90.8637, -45.6372)
  point P2 (-62.8637, -31.1886)
  point P3 (-34.8637, -16.7401)
  point P4 (-3.5501, -12.0009)
  point P5 (-9, -8.4539)
  point P6 (-8.0885, -15)
  point P7 (-3.9115, -15)
  point P8 (-9, -6.5461)
  point P9 (-3.5501, -2.9991)
  point P10 (-3.9115, 0)
  point P11 (-8.0885, 0)
  point P12 (-26.046, -5.8768)
  point P13 (-41.1629, -29.2335)
  point P14 (-40.2692, -31.3677)
  point P15 (-14.3638, -18)
  point P16 (-18.4832, -11.8836)
  point P17 (-23.6655, -5.7976)
  point P18 (-43.6814, -27.6035)
  point P19 (-28.5645, -4.2467)
  point P20 (-29.4581, -2.1125)
  point P21 (-77.9176, -27.1186)
  point P22 (-76.696, -29.0835)
  point P23 (-48.9005, -30.2967)
  point P24 (-49.0314, -33.2938)
  point P25 (-76.8268, -32.0806)
  point P26 (-82.046, -34.7738)
  point P27 (-97.1629, -58.1306)
  point P28 (-96.2692, -60.2648)
  point P29 (-47.8098, -35.2587)
  point P30 (-99.6814, -56.5005)
  point P31 (-84.5645, -33.1438)
  point P32 (-85.4581, -31.0096)
  point P33 (-133.9176, -56.0156)
  point P34 (-132.696, -57.9806)
  point P35 (-104.9005, -59.1937)
  point P36 (-105.0314, -62.1909)
  point P37 (-132.8268, -60.9777)
  point P38 (-140.7098, -61.8412)
  point P39 (-148.8337, -73)
  point P40 (-130.0105, -77.6759)
  point P41 (-103.8098, -64.1558)
  dimension "d65" = 3
  dimension "d66" = 3
  dimension "d67" = 3
  dimension "d68" = 3
  dimension "d69" = 3
  dimension "d70" = 3
  dimension "d71" = 3
  dimension "d72" = 3
  dimension "d73" = 3
  dimension "d74" = 3.1
  dimension "d75" = 3
  dimension "d76" = 3
  dimension "d77" = 3
  dimension "d78" = 3
  dimension "d79" = 3
  dimension "d80" = 3
extrude "押し出し3" cut sketch "スケッチ3" against normal blind 3 contours L30 L21 A23 L32 A22 L19 A36 | L15 A21 L35 A22 L33 A23 | L19 A22 L36 A21 L38 A24 | L15 A30 L41 A24 L39 A21 | A24 L42 A30 A25 A28 L25 L19 | L18 A29 L22 A35 A31 | L16 A34 A35 L22 A26
properties part number "横回転カウンター根本" material "アルミニウム 7075"
